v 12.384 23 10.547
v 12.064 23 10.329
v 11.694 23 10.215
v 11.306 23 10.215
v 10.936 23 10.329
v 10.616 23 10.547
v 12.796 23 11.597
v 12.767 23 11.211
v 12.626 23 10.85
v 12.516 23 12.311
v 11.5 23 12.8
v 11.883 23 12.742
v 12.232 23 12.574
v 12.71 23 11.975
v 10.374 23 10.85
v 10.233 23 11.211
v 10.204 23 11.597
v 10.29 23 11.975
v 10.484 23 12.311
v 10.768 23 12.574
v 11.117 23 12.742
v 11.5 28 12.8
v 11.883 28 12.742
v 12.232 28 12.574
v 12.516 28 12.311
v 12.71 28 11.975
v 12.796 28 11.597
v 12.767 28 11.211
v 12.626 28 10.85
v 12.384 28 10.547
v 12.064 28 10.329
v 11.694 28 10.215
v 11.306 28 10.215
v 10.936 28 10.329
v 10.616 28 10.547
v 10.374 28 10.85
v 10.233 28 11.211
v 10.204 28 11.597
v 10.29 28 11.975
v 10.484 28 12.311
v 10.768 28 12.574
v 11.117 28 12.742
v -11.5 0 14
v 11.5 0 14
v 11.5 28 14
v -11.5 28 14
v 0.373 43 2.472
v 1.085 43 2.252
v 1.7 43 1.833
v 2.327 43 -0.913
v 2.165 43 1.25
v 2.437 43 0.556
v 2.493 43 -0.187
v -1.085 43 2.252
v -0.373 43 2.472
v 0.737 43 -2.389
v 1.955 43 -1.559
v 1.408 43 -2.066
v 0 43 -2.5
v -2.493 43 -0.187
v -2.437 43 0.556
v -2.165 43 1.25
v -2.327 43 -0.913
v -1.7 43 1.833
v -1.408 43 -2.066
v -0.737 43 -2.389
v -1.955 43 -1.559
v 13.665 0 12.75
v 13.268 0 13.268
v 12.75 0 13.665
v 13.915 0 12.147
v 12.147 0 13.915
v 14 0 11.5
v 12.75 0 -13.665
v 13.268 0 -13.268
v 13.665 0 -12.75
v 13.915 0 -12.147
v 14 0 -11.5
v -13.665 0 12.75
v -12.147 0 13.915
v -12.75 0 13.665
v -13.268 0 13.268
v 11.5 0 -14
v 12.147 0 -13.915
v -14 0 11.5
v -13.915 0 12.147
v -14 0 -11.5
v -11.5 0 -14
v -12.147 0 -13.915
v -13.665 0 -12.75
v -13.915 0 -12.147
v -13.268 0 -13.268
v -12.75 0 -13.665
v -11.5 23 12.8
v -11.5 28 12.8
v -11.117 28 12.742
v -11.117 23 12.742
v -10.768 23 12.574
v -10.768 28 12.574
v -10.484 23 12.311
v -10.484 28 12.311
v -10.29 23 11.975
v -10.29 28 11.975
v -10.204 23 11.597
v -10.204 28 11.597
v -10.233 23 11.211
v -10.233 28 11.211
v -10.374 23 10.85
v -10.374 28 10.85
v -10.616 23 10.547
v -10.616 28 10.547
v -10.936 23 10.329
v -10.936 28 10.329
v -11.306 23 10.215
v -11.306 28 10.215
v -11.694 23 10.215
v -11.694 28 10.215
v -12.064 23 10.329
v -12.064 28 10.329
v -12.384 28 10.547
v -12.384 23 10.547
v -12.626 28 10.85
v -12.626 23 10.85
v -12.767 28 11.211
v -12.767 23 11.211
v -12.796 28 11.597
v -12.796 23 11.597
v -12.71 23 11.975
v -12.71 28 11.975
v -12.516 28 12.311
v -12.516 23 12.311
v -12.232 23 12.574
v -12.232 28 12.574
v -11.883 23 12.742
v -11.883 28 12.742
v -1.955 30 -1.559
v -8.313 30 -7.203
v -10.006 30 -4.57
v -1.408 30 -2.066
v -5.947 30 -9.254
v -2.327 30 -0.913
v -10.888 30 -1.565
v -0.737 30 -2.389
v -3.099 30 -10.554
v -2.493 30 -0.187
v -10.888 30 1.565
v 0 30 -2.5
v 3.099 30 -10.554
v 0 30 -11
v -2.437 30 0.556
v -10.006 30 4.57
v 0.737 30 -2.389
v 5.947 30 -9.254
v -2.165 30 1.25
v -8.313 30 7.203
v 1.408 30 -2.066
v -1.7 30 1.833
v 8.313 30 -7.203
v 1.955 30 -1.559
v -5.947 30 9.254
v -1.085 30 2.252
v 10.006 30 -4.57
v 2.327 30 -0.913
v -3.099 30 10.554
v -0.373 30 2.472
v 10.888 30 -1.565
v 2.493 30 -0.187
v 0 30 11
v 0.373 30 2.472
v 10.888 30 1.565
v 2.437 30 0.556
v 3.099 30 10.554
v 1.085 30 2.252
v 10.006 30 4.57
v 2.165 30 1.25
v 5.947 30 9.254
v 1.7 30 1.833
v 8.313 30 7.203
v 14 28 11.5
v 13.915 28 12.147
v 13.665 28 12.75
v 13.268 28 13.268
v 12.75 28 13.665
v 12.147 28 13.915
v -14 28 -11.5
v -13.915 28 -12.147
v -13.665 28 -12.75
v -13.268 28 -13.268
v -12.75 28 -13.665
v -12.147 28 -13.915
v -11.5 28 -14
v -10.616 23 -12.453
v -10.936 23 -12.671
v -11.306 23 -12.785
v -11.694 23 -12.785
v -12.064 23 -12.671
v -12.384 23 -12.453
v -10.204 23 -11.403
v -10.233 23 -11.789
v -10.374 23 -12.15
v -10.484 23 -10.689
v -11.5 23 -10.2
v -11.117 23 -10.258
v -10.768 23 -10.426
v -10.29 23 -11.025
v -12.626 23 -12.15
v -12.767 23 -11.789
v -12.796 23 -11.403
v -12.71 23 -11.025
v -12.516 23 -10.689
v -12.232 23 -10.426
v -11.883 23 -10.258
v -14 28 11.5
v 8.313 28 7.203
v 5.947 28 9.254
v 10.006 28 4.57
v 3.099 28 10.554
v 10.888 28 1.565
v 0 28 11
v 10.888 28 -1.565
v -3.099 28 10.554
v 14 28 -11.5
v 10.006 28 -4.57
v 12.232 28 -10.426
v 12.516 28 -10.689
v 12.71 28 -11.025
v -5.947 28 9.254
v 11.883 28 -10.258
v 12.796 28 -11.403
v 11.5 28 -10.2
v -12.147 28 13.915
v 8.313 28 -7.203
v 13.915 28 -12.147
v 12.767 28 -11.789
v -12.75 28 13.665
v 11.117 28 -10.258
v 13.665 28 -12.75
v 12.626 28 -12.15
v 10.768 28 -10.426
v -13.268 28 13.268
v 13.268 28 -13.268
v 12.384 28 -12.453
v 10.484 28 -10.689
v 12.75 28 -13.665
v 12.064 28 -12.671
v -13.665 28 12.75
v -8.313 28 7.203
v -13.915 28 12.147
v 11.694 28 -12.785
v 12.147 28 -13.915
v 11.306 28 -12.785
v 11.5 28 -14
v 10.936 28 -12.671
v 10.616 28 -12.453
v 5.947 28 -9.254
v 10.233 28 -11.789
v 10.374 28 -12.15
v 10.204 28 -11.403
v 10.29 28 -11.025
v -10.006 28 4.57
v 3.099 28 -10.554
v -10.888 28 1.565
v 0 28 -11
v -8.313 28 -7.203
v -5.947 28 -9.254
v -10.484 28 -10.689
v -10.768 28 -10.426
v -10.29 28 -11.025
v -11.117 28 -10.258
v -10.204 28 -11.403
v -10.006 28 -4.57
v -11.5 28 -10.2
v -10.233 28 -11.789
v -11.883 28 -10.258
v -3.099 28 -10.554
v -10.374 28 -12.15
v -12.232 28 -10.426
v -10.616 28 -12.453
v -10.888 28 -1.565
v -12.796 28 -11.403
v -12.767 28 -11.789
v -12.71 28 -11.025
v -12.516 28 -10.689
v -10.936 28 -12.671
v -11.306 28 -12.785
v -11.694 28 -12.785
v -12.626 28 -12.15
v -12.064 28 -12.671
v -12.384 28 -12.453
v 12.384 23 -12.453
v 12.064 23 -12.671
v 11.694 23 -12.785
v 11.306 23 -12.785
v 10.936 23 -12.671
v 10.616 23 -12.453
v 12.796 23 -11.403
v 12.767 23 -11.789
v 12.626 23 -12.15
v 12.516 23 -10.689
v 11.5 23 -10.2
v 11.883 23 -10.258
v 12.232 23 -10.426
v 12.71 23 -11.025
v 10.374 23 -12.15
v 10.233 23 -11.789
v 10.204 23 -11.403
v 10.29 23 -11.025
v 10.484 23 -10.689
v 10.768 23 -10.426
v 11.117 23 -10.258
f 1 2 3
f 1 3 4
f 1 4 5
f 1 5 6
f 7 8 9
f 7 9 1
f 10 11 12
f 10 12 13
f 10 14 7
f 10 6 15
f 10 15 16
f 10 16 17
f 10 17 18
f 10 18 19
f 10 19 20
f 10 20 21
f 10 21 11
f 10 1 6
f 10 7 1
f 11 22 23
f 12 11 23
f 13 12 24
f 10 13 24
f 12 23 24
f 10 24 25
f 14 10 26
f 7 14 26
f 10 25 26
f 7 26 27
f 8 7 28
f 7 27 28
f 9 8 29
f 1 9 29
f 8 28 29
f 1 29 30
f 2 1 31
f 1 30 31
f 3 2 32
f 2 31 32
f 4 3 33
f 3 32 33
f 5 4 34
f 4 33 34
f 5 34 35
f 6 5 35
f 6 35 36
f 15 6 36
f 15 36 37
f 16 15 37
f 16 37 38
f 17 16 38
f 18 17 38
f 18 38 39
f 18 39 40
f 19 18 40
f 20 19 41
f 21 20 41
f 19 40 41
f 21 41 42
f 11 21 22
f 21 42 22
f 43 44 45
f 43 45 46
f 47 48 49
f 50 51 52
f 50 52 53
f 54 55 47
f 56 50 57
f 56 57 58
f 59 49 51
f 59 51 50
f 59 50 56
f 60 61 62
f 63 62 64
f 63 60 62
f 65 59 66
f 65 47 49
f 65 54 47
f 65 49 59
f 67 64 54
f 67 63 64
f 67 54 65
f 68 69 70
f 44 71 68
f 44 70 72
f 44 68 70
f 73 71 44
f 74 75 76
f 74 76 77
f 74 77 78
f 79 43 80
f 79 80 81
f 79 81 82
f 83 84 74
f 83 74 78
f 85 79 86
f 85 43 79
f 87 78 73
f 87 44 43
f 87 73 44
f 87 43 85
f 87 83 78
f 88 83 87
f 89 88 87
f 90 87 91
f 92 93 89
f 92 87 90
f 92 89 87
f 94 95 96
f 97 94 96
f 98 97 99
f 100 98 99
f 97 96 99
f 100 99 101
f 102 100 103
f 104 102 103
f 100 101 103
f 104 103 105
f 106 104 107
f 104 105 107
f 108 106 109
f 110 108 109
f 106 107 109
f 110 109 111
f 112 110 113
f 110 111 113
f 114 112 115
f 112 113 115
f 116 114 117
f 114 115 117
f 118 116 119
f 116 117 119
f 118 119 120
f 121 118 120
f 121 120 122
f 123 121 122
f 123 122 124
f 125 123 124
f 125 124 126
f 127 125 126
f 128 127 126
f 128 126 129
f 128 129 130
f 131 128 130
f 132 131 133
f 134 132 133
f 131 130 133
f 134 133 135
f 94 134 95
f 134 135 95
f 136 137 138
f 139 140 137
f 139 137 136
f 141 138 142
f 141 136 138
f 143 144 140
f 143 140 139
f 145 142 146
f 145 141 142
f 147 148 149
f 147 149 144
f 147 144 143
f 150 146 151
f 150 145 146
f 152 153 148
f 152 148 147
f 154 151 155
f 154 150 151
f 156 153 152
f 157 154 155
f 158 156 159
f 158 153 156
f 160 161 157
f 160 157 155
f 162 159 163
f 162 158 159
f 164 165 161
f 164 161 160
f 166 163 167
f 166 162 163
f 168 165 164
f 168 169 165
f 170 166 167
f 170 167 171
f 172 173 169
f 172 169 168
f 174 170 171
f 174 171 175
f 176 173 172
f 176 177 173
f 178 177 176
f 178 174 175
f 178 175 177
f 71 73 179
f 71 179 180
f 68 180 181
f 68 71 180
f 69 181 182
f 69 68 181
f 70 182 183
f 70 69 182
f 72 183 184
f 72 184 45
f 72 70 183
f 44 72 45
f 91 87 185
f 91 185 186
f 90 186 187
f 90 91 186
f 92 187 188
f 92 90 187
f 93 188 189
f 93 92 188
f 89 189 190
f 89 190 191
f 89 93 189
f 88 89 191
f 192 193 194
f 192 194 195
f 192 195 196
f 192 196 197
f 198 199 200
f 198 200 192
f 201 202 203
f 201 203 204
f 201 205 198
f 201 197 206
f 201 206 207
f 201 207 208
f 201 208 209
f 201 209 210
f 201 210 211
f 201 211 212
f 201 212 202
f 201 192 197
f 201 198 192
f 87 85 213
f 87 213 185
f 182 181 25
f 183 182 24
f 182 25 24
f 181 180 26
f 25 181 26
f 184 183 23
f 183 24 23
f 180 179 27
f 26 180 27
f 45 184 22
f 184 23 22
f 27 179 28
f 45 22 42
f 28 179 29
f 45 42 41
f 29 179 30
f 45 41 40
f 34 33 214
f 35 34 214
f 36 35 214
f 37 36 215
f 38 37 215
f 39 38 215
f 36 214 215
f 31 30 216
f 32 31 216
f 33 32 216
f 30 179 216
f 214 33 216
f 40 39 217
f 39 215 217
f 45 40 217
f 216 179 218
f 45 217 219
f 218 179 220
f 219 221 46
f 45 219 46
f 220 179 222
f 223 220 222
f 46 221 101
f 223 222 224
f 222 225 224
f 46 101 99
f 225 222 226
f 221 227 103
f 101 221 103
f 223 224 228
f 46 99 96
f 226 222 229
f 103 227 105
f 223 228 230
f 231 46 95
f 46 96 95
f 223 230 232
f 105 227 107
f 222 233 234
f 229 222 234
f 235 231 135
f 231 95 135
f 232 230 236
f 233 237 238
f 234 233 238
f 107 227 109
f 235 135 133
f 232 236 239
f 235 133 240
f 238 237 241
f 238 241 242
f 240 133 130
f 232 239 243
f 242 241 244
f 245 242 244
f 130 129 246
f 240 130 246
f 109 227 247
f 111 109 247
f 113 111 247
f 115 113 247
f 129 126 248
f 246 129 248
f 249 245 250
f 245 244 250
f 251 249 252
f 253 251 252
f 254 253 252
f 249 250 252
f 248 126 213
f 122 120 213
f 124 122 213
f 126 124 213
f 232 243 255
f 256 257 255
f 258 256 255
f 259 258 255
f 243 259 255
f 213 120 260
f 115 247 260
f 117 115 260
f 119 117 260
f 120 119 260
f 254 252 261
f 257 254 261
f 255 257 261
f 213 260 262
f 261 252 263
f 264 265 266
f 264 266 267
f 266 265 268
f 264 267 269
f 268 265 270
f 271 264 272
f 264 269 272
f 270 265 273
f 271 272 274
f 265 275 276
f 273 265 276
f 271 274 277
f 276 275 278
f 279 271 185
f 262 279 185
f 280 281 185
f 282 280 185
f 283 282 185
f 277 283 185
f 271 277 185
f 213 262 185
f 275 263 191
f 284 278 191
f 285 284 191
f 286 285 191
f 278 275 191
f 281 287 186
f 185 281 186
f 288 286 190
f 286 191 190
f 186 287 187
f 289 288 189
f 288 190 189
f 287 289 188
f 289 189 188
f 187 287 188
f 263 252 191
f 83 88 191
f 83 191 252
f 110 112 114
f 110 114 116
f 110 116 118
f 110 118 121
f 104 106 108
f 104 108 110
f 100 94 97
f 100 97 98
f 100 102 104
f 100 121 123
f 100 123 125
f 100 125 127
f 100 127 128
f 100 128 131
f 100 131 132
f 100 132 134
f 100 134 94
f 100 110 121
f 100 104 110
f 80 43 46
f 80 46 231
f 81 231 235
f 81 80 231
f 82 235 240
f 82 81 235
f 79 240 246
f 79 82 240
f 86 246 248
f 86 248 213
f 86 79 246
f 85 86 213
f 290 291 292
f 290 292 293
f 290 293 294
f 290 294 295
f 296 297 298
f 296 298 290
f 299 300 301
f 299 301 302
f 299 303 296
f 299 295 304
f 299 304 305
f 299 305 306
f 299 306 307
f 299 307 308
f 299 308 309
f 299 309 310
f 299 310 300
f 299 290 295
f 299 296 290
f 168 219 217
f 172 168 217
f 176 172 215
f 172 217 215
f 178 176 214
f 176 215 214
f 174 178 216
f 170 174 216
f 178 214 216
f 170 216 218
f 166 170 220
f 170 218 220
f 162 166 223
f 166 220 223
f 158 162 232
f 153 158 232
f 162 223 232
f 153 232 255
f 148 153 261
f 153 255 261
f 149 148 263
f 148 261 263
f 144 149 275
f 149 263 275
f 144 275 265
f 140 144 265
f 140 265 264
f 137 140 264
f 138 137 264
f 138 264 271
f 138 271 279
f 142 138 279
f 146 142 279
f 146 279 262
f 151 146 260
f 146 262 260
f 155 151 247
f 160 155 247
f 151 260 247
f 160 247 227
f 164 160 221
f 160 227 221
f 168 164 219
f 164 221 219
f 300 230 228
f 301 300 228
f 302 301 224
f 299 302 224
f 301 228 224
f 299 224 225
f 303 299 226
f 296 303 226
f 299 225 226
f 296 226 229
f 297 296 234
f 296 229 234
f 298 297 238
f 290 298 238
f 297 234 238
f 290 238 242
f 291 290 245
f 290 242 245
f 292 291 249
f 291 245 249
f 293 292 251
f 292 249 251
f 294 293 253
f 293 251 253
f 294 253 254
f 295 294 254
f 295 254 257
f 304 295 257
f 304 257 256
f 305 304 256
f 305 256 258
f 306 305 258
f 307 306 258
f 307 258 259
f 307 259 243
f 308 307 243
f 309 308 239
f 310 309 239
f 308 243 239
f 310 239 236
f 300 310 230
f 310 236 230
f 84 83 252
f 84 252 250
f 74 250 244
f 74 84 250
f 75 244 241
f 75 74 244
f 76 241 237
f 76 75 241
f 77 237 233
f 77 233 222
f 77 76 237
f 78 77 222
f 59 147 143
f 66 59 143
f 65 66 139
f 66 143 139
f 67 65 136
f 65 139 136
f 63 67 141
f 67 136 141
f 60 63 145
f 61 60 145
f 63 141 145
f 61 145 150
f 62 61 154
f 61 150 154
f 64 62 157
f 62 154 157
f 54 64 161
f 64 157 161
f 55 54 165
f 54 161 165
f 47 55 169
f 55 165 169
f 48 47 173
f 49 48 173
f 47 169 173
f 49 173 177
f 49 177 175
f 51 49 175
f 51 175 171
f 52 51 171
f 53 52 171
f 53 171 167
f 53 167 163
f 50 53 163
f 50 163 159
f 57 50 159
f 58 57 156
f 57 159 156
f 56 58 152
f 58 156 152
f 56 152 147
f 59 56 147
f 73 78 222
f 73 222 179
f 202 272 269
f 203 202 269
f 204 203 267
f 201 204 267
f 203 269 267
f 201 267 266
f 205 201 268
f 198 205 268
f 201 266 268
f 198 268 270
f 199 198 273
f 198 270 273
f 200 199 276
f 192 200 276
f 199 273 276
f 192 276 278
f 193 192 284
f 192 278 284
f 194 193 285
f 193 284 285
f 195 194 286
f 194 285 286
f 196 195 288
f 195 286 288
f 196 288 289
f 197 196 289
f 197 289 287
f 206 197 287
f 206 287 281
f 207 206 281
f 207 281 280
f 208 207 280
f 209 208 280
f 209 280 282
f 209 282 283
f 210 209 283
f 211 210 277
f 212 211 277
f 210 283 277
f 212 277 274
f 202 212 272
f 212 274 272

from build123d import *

# Parameters (mm, degrees)
EXTRUDE_1_DEPTH     = 28
SKETCH_2_R          = 11
EXTRUDE_2_DEPTH     = 2
SKETCH_3_R          = 2.5
EXTRUDE_3_DEPTH     = 13
SKETCH_4_R          = 1.3
CUT_EXTRUDE_1_DEPTH = 5


with BuildPart() as part:
    # 草图1 → 凸台-拉伸1 (new body)
    with BuildSketch(Plane(origin=(0, 0, 0), x_dir=(1, 0, 0), z_dir=(0, 1, 0))):
        with BuildLine():
            Line((-11.5, 14), (11.5, 14))
            ThreePointArc((11.5, 14), (13.267766953, 13.267766953), (14, 11.5))
            Line((14, 11.5), (14, -11.5))
            ThreePointArc((14, -11.5), (13.267766953, -13.267766953), (11.5, -14))
            Line((11.5, -14), (-11.5, -14))
            ThreePointArc((-11.5, -14), (-13.267766953, -13.267766953), (-14, -11.5))
            Line((-14, -11.5), (-14, 11.5))
            ThreePointArc((-14, 11.5), (-13.267766953, 13.267766953), (-11.5, 14))
        make_face()
    extrude(amount=EXTRUDE_1_DEPTH)

    # 草图2 → 凸台-拉伸2 (add)
    with BuildSketch(Plane(origin=(0, 28, 0), x_dir=(-1, 0, 0), z_dir=(0, 1, 0))):
        with Locations(Location((0, 0, 0), (0, 0, 90))):
            Circle(SKETCH_2_R)
    extrude(amount=EXTRUDE_2_DEPTH)

    # 草图3 → 凸台-拉伸3 (add)
    with BuildSketch(Plane(origin=(0, 30, 0), x_dir=(-1, 0, 0), z_dir=(0, 1, 0))):
        with Locations(Location((0, 0, 0), (0, 0, 270))):
            Circle(SKETCH_3_R)
    extrude(amount=EXTRUDE_3_DEPTH)

    # 草图4 → 切除-拉伸1 (cut)
    with BuildSketch(Plane(origin=(0, 28, 0), x_dir=(-1, 0, 0), z_dir=(0, 1, 0))):
        with Locations(Location((11.5, 11.5, 0), (0, 0, 90))):
            Circle(SKETCH_4_R)
        with Locations(Location((11.5, -11.5, 0), (0, 0, 90))):
            Circle(SKETCH_4_R)
        with Locations(Location((-11.5, -11.5, 0), (0, 0, 90))):
            Circle(SKETCH_4_R)
        with Locations(Location((-11.5, 11.5, 0), (0, 0, 90))):
            Circle(SKETCH_4_R)
    extrude(amount=-CUT_EXTRUDE_1_DEPTH, mode=Mode.SUBTRACT)


solid = part.part
